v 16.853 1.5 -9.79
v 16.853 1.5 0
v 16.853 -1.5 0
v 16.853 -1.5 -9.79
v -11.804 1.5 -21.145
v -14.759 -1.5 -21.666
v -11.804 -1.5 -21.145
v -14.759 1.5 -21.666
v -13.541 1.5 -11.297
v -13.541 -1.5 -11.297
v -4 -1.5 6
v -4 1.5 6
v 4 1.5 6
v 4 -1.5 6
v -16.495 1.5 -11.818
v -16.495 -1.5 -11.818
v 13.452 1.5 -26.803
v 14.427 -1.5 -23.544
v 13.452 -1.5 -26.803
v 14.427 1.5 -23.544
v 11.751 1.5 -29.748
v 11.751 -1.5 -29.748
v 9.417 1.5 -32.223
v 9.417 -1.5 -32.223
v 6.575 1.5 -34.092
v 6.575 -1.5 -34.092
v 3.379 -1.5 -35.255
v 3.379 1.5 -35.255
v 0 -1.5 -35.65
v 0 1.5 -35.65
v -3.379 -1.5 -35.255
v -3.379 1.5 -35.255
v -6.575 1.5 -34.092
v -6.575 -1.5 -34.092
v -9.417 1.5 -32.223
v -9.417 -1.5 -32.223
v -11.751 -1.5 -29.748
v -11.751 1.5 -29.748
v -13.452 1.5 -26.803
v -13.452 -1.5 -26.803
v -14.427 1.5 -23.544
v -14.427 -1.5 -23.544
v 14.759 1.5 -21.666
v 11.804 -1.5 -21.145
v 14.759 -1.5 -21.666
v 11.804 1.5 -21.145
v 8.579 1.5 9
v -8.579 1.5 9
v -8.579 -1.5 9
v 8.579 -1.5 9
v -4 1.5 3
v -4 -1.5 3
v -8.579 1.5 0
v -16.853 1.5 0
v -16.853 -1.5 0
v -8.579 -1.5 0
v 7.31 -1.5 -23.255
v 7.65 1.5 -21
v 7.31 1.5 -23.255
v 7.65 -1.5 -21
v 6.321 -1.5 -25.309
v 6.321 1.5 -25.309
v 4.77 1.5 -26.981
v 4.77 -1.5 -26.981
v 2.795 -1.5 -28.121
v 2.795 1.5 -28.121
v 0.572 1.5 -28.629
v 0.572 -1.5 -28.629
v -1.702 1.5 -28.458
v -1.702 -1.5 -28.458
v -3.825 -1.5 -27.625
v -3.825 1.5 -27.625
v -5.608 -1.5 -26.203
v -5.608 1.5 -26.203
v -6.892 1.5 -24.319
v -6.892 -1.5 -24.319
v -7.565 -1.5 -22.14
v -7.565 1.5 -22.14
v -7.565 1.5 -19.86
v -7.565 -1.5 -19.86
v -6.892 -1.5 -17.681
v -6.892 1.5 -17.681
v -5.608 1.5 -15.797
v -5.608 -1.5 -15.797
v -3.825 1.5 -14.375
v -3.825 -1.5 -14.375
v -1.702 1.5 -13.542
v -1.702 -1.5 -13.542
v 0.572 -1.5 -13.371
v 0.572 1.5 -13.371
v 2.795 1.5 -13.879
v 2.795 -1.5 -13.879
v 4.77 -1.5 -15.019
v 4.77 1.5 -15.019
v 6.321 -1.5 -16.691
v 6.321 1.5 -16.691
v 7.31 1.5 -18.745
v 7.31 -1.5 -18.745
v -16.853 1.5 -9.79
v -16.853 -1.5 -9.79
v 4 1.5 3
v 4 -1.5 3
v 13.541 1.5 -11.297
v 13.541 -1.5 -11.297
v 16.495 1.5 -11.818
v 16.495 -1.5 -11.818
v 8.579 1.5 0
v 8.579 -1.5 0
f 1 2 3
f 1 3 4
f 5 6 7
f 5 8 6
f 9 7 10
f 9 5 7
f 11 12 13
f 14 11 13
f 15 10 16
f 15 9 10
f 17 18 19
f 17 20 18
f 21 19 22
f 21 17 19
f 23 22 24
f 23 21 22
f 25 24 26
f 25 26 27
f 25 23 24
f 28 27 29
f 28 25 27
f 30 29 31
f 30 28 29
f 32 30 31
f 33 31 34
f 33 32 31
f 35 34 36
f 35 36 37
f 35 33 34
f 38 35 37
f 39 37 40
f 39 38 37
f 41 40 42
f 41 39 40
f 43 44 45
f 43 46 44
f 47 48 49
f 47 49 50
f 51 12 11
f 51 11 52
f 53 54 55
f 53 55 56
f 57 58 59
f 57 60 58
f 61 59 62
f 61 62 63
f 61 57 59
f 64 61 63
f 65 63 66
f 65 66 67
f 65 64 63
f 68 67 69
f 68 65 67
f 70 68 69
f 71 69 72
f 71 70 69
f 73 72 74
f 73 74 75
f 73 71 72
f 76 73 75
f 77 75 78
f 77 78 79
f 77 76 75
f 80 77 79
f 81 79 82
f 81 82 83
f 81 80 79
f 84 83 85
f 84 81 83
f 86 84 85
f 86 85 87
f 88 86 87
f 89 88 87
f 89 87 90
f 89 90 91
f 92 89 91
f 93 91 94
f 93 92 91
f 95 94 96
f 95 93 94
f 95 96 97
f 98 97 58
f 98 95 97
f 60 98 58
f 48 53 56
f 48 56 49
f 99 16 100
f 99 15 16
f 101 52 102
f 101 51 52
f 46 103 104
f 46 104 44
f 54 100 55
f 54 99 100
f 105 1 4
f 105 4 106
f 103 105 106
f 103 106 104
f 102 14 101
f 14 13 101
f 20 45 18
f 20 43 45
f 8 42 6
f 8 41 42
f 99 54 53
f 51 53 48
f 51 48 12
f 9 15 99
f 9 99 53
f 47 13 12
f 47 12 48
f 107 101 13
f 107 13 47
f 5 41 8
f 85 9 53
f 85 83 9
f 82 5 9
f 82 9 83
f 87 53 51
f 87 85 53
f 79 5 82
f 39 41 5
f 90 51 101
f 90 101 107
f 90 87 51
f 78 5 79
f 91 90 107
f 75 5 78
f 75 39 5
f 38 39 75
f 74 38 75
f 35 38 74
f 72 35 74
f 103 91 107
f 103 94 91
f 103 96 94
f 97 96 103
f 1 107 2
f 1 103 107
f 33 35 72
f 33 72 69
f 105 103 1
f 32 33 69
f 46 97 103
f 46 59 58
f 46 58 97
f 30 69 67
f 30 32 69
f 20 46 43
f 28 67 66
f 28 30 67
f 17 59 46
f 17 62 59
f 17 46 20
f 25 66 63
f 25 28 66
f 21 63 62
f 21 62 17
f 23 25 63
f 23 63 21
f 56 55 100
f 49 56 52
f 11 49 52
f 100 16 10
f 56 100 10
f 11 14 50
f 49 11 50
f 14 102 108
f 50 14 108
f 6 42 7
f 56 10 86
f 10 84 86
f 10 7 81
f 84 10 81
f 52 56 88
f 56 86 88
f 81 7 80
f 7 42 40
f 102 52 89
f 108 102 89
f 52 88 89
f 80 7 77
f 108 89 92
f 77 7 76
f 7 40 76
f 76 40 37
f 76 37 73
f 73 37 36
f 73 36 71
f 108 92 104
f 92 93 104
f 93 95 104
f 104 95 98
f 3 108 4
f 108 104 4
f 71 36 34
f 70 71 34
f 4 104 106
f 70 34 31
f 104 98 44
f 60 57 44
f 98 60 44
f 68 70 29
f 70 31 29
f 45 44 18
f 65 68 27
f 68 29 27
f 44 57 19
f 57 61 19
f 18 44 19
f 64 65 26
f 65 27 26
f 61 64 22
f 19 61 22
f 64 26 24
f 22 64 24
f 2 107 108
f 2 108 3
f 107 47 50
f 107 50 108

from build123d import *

# Parameters (mm, degrees)
SKETCH1_R           = 7.65
SKETCH1_W           = 8
SKETCH1_H           = 3
BOSS_EXTRUDE1_DEPTH = 1.5


with BuildPart() as part:
    # Sketch1 → Boss-Extrude1 (new, symmetric)
    with BuildSketch(Plane(origin=(0, 0, 0), x_dir=(1, 0, 0), z_dir=(0, 1, 0))):
        with BuildLine():
            Line((-16.852566459, 9.790333805), (-16.852566459, 0))
            Line((-16.852566459, 0), (-8.578866459, 0))
            Line((-8.578866459, 0), (-8.578866459, -9))
            Line((-8.578866459, -9), (8.578866459, -9))
            Line((8.578866459, -9), (8.578866459, 0))
            Line((8.578866459, 0), (16.852566459, 0))
            Line((16.852566459, 0), (16.852566459, 9.790333805))
            Line((16.852566459, 9.790333805), (16.495088327, 11.817693036))
            Line((16.495088327, 11.817693036), (13.540665068, 11.296748503))
            Line((13.540665068, 11.296748503), (11.804183291, 21.144826033))
            Line((11.804183291, 21.144826033), (14.75860655, 21.665770566))
            Line((14.75860655, 21.665770566), (14.427433582, 23.543945803))
            ThreePointArc((14.427433582, 23.543945803), (0, 35.65), (-14.427433582, 23.543945803))
            Line((-14.427433582, 23.543945803), (-14.75860655, 21.665770566))
            Line((-14.75860655, 21.665770566), (-11.804183291, 21.144826033))
            Line((-11.804183291, 21.144826033), (-13.540665068, 11.296748503))
            Line((-13.540665068, 11.296748503), (-16.495088327, 11.817693036))
            Line((-16.495088327, 11.817693036), (-16.852566459, 9.790333805))
        make_face()
        with Locations((0, 21)):
            Circle(SKETCH1_R, mode=Mode.SUBTRACT)
        with Locations((0, -4.5)):
            Rectangle(SKETCH1_W, SKETCH1_H, mode=Mode.SUBTRACT)
    extrude(amount=BOSS_EXTRUDE1_DEPTH, both=True)


solid = part.part
